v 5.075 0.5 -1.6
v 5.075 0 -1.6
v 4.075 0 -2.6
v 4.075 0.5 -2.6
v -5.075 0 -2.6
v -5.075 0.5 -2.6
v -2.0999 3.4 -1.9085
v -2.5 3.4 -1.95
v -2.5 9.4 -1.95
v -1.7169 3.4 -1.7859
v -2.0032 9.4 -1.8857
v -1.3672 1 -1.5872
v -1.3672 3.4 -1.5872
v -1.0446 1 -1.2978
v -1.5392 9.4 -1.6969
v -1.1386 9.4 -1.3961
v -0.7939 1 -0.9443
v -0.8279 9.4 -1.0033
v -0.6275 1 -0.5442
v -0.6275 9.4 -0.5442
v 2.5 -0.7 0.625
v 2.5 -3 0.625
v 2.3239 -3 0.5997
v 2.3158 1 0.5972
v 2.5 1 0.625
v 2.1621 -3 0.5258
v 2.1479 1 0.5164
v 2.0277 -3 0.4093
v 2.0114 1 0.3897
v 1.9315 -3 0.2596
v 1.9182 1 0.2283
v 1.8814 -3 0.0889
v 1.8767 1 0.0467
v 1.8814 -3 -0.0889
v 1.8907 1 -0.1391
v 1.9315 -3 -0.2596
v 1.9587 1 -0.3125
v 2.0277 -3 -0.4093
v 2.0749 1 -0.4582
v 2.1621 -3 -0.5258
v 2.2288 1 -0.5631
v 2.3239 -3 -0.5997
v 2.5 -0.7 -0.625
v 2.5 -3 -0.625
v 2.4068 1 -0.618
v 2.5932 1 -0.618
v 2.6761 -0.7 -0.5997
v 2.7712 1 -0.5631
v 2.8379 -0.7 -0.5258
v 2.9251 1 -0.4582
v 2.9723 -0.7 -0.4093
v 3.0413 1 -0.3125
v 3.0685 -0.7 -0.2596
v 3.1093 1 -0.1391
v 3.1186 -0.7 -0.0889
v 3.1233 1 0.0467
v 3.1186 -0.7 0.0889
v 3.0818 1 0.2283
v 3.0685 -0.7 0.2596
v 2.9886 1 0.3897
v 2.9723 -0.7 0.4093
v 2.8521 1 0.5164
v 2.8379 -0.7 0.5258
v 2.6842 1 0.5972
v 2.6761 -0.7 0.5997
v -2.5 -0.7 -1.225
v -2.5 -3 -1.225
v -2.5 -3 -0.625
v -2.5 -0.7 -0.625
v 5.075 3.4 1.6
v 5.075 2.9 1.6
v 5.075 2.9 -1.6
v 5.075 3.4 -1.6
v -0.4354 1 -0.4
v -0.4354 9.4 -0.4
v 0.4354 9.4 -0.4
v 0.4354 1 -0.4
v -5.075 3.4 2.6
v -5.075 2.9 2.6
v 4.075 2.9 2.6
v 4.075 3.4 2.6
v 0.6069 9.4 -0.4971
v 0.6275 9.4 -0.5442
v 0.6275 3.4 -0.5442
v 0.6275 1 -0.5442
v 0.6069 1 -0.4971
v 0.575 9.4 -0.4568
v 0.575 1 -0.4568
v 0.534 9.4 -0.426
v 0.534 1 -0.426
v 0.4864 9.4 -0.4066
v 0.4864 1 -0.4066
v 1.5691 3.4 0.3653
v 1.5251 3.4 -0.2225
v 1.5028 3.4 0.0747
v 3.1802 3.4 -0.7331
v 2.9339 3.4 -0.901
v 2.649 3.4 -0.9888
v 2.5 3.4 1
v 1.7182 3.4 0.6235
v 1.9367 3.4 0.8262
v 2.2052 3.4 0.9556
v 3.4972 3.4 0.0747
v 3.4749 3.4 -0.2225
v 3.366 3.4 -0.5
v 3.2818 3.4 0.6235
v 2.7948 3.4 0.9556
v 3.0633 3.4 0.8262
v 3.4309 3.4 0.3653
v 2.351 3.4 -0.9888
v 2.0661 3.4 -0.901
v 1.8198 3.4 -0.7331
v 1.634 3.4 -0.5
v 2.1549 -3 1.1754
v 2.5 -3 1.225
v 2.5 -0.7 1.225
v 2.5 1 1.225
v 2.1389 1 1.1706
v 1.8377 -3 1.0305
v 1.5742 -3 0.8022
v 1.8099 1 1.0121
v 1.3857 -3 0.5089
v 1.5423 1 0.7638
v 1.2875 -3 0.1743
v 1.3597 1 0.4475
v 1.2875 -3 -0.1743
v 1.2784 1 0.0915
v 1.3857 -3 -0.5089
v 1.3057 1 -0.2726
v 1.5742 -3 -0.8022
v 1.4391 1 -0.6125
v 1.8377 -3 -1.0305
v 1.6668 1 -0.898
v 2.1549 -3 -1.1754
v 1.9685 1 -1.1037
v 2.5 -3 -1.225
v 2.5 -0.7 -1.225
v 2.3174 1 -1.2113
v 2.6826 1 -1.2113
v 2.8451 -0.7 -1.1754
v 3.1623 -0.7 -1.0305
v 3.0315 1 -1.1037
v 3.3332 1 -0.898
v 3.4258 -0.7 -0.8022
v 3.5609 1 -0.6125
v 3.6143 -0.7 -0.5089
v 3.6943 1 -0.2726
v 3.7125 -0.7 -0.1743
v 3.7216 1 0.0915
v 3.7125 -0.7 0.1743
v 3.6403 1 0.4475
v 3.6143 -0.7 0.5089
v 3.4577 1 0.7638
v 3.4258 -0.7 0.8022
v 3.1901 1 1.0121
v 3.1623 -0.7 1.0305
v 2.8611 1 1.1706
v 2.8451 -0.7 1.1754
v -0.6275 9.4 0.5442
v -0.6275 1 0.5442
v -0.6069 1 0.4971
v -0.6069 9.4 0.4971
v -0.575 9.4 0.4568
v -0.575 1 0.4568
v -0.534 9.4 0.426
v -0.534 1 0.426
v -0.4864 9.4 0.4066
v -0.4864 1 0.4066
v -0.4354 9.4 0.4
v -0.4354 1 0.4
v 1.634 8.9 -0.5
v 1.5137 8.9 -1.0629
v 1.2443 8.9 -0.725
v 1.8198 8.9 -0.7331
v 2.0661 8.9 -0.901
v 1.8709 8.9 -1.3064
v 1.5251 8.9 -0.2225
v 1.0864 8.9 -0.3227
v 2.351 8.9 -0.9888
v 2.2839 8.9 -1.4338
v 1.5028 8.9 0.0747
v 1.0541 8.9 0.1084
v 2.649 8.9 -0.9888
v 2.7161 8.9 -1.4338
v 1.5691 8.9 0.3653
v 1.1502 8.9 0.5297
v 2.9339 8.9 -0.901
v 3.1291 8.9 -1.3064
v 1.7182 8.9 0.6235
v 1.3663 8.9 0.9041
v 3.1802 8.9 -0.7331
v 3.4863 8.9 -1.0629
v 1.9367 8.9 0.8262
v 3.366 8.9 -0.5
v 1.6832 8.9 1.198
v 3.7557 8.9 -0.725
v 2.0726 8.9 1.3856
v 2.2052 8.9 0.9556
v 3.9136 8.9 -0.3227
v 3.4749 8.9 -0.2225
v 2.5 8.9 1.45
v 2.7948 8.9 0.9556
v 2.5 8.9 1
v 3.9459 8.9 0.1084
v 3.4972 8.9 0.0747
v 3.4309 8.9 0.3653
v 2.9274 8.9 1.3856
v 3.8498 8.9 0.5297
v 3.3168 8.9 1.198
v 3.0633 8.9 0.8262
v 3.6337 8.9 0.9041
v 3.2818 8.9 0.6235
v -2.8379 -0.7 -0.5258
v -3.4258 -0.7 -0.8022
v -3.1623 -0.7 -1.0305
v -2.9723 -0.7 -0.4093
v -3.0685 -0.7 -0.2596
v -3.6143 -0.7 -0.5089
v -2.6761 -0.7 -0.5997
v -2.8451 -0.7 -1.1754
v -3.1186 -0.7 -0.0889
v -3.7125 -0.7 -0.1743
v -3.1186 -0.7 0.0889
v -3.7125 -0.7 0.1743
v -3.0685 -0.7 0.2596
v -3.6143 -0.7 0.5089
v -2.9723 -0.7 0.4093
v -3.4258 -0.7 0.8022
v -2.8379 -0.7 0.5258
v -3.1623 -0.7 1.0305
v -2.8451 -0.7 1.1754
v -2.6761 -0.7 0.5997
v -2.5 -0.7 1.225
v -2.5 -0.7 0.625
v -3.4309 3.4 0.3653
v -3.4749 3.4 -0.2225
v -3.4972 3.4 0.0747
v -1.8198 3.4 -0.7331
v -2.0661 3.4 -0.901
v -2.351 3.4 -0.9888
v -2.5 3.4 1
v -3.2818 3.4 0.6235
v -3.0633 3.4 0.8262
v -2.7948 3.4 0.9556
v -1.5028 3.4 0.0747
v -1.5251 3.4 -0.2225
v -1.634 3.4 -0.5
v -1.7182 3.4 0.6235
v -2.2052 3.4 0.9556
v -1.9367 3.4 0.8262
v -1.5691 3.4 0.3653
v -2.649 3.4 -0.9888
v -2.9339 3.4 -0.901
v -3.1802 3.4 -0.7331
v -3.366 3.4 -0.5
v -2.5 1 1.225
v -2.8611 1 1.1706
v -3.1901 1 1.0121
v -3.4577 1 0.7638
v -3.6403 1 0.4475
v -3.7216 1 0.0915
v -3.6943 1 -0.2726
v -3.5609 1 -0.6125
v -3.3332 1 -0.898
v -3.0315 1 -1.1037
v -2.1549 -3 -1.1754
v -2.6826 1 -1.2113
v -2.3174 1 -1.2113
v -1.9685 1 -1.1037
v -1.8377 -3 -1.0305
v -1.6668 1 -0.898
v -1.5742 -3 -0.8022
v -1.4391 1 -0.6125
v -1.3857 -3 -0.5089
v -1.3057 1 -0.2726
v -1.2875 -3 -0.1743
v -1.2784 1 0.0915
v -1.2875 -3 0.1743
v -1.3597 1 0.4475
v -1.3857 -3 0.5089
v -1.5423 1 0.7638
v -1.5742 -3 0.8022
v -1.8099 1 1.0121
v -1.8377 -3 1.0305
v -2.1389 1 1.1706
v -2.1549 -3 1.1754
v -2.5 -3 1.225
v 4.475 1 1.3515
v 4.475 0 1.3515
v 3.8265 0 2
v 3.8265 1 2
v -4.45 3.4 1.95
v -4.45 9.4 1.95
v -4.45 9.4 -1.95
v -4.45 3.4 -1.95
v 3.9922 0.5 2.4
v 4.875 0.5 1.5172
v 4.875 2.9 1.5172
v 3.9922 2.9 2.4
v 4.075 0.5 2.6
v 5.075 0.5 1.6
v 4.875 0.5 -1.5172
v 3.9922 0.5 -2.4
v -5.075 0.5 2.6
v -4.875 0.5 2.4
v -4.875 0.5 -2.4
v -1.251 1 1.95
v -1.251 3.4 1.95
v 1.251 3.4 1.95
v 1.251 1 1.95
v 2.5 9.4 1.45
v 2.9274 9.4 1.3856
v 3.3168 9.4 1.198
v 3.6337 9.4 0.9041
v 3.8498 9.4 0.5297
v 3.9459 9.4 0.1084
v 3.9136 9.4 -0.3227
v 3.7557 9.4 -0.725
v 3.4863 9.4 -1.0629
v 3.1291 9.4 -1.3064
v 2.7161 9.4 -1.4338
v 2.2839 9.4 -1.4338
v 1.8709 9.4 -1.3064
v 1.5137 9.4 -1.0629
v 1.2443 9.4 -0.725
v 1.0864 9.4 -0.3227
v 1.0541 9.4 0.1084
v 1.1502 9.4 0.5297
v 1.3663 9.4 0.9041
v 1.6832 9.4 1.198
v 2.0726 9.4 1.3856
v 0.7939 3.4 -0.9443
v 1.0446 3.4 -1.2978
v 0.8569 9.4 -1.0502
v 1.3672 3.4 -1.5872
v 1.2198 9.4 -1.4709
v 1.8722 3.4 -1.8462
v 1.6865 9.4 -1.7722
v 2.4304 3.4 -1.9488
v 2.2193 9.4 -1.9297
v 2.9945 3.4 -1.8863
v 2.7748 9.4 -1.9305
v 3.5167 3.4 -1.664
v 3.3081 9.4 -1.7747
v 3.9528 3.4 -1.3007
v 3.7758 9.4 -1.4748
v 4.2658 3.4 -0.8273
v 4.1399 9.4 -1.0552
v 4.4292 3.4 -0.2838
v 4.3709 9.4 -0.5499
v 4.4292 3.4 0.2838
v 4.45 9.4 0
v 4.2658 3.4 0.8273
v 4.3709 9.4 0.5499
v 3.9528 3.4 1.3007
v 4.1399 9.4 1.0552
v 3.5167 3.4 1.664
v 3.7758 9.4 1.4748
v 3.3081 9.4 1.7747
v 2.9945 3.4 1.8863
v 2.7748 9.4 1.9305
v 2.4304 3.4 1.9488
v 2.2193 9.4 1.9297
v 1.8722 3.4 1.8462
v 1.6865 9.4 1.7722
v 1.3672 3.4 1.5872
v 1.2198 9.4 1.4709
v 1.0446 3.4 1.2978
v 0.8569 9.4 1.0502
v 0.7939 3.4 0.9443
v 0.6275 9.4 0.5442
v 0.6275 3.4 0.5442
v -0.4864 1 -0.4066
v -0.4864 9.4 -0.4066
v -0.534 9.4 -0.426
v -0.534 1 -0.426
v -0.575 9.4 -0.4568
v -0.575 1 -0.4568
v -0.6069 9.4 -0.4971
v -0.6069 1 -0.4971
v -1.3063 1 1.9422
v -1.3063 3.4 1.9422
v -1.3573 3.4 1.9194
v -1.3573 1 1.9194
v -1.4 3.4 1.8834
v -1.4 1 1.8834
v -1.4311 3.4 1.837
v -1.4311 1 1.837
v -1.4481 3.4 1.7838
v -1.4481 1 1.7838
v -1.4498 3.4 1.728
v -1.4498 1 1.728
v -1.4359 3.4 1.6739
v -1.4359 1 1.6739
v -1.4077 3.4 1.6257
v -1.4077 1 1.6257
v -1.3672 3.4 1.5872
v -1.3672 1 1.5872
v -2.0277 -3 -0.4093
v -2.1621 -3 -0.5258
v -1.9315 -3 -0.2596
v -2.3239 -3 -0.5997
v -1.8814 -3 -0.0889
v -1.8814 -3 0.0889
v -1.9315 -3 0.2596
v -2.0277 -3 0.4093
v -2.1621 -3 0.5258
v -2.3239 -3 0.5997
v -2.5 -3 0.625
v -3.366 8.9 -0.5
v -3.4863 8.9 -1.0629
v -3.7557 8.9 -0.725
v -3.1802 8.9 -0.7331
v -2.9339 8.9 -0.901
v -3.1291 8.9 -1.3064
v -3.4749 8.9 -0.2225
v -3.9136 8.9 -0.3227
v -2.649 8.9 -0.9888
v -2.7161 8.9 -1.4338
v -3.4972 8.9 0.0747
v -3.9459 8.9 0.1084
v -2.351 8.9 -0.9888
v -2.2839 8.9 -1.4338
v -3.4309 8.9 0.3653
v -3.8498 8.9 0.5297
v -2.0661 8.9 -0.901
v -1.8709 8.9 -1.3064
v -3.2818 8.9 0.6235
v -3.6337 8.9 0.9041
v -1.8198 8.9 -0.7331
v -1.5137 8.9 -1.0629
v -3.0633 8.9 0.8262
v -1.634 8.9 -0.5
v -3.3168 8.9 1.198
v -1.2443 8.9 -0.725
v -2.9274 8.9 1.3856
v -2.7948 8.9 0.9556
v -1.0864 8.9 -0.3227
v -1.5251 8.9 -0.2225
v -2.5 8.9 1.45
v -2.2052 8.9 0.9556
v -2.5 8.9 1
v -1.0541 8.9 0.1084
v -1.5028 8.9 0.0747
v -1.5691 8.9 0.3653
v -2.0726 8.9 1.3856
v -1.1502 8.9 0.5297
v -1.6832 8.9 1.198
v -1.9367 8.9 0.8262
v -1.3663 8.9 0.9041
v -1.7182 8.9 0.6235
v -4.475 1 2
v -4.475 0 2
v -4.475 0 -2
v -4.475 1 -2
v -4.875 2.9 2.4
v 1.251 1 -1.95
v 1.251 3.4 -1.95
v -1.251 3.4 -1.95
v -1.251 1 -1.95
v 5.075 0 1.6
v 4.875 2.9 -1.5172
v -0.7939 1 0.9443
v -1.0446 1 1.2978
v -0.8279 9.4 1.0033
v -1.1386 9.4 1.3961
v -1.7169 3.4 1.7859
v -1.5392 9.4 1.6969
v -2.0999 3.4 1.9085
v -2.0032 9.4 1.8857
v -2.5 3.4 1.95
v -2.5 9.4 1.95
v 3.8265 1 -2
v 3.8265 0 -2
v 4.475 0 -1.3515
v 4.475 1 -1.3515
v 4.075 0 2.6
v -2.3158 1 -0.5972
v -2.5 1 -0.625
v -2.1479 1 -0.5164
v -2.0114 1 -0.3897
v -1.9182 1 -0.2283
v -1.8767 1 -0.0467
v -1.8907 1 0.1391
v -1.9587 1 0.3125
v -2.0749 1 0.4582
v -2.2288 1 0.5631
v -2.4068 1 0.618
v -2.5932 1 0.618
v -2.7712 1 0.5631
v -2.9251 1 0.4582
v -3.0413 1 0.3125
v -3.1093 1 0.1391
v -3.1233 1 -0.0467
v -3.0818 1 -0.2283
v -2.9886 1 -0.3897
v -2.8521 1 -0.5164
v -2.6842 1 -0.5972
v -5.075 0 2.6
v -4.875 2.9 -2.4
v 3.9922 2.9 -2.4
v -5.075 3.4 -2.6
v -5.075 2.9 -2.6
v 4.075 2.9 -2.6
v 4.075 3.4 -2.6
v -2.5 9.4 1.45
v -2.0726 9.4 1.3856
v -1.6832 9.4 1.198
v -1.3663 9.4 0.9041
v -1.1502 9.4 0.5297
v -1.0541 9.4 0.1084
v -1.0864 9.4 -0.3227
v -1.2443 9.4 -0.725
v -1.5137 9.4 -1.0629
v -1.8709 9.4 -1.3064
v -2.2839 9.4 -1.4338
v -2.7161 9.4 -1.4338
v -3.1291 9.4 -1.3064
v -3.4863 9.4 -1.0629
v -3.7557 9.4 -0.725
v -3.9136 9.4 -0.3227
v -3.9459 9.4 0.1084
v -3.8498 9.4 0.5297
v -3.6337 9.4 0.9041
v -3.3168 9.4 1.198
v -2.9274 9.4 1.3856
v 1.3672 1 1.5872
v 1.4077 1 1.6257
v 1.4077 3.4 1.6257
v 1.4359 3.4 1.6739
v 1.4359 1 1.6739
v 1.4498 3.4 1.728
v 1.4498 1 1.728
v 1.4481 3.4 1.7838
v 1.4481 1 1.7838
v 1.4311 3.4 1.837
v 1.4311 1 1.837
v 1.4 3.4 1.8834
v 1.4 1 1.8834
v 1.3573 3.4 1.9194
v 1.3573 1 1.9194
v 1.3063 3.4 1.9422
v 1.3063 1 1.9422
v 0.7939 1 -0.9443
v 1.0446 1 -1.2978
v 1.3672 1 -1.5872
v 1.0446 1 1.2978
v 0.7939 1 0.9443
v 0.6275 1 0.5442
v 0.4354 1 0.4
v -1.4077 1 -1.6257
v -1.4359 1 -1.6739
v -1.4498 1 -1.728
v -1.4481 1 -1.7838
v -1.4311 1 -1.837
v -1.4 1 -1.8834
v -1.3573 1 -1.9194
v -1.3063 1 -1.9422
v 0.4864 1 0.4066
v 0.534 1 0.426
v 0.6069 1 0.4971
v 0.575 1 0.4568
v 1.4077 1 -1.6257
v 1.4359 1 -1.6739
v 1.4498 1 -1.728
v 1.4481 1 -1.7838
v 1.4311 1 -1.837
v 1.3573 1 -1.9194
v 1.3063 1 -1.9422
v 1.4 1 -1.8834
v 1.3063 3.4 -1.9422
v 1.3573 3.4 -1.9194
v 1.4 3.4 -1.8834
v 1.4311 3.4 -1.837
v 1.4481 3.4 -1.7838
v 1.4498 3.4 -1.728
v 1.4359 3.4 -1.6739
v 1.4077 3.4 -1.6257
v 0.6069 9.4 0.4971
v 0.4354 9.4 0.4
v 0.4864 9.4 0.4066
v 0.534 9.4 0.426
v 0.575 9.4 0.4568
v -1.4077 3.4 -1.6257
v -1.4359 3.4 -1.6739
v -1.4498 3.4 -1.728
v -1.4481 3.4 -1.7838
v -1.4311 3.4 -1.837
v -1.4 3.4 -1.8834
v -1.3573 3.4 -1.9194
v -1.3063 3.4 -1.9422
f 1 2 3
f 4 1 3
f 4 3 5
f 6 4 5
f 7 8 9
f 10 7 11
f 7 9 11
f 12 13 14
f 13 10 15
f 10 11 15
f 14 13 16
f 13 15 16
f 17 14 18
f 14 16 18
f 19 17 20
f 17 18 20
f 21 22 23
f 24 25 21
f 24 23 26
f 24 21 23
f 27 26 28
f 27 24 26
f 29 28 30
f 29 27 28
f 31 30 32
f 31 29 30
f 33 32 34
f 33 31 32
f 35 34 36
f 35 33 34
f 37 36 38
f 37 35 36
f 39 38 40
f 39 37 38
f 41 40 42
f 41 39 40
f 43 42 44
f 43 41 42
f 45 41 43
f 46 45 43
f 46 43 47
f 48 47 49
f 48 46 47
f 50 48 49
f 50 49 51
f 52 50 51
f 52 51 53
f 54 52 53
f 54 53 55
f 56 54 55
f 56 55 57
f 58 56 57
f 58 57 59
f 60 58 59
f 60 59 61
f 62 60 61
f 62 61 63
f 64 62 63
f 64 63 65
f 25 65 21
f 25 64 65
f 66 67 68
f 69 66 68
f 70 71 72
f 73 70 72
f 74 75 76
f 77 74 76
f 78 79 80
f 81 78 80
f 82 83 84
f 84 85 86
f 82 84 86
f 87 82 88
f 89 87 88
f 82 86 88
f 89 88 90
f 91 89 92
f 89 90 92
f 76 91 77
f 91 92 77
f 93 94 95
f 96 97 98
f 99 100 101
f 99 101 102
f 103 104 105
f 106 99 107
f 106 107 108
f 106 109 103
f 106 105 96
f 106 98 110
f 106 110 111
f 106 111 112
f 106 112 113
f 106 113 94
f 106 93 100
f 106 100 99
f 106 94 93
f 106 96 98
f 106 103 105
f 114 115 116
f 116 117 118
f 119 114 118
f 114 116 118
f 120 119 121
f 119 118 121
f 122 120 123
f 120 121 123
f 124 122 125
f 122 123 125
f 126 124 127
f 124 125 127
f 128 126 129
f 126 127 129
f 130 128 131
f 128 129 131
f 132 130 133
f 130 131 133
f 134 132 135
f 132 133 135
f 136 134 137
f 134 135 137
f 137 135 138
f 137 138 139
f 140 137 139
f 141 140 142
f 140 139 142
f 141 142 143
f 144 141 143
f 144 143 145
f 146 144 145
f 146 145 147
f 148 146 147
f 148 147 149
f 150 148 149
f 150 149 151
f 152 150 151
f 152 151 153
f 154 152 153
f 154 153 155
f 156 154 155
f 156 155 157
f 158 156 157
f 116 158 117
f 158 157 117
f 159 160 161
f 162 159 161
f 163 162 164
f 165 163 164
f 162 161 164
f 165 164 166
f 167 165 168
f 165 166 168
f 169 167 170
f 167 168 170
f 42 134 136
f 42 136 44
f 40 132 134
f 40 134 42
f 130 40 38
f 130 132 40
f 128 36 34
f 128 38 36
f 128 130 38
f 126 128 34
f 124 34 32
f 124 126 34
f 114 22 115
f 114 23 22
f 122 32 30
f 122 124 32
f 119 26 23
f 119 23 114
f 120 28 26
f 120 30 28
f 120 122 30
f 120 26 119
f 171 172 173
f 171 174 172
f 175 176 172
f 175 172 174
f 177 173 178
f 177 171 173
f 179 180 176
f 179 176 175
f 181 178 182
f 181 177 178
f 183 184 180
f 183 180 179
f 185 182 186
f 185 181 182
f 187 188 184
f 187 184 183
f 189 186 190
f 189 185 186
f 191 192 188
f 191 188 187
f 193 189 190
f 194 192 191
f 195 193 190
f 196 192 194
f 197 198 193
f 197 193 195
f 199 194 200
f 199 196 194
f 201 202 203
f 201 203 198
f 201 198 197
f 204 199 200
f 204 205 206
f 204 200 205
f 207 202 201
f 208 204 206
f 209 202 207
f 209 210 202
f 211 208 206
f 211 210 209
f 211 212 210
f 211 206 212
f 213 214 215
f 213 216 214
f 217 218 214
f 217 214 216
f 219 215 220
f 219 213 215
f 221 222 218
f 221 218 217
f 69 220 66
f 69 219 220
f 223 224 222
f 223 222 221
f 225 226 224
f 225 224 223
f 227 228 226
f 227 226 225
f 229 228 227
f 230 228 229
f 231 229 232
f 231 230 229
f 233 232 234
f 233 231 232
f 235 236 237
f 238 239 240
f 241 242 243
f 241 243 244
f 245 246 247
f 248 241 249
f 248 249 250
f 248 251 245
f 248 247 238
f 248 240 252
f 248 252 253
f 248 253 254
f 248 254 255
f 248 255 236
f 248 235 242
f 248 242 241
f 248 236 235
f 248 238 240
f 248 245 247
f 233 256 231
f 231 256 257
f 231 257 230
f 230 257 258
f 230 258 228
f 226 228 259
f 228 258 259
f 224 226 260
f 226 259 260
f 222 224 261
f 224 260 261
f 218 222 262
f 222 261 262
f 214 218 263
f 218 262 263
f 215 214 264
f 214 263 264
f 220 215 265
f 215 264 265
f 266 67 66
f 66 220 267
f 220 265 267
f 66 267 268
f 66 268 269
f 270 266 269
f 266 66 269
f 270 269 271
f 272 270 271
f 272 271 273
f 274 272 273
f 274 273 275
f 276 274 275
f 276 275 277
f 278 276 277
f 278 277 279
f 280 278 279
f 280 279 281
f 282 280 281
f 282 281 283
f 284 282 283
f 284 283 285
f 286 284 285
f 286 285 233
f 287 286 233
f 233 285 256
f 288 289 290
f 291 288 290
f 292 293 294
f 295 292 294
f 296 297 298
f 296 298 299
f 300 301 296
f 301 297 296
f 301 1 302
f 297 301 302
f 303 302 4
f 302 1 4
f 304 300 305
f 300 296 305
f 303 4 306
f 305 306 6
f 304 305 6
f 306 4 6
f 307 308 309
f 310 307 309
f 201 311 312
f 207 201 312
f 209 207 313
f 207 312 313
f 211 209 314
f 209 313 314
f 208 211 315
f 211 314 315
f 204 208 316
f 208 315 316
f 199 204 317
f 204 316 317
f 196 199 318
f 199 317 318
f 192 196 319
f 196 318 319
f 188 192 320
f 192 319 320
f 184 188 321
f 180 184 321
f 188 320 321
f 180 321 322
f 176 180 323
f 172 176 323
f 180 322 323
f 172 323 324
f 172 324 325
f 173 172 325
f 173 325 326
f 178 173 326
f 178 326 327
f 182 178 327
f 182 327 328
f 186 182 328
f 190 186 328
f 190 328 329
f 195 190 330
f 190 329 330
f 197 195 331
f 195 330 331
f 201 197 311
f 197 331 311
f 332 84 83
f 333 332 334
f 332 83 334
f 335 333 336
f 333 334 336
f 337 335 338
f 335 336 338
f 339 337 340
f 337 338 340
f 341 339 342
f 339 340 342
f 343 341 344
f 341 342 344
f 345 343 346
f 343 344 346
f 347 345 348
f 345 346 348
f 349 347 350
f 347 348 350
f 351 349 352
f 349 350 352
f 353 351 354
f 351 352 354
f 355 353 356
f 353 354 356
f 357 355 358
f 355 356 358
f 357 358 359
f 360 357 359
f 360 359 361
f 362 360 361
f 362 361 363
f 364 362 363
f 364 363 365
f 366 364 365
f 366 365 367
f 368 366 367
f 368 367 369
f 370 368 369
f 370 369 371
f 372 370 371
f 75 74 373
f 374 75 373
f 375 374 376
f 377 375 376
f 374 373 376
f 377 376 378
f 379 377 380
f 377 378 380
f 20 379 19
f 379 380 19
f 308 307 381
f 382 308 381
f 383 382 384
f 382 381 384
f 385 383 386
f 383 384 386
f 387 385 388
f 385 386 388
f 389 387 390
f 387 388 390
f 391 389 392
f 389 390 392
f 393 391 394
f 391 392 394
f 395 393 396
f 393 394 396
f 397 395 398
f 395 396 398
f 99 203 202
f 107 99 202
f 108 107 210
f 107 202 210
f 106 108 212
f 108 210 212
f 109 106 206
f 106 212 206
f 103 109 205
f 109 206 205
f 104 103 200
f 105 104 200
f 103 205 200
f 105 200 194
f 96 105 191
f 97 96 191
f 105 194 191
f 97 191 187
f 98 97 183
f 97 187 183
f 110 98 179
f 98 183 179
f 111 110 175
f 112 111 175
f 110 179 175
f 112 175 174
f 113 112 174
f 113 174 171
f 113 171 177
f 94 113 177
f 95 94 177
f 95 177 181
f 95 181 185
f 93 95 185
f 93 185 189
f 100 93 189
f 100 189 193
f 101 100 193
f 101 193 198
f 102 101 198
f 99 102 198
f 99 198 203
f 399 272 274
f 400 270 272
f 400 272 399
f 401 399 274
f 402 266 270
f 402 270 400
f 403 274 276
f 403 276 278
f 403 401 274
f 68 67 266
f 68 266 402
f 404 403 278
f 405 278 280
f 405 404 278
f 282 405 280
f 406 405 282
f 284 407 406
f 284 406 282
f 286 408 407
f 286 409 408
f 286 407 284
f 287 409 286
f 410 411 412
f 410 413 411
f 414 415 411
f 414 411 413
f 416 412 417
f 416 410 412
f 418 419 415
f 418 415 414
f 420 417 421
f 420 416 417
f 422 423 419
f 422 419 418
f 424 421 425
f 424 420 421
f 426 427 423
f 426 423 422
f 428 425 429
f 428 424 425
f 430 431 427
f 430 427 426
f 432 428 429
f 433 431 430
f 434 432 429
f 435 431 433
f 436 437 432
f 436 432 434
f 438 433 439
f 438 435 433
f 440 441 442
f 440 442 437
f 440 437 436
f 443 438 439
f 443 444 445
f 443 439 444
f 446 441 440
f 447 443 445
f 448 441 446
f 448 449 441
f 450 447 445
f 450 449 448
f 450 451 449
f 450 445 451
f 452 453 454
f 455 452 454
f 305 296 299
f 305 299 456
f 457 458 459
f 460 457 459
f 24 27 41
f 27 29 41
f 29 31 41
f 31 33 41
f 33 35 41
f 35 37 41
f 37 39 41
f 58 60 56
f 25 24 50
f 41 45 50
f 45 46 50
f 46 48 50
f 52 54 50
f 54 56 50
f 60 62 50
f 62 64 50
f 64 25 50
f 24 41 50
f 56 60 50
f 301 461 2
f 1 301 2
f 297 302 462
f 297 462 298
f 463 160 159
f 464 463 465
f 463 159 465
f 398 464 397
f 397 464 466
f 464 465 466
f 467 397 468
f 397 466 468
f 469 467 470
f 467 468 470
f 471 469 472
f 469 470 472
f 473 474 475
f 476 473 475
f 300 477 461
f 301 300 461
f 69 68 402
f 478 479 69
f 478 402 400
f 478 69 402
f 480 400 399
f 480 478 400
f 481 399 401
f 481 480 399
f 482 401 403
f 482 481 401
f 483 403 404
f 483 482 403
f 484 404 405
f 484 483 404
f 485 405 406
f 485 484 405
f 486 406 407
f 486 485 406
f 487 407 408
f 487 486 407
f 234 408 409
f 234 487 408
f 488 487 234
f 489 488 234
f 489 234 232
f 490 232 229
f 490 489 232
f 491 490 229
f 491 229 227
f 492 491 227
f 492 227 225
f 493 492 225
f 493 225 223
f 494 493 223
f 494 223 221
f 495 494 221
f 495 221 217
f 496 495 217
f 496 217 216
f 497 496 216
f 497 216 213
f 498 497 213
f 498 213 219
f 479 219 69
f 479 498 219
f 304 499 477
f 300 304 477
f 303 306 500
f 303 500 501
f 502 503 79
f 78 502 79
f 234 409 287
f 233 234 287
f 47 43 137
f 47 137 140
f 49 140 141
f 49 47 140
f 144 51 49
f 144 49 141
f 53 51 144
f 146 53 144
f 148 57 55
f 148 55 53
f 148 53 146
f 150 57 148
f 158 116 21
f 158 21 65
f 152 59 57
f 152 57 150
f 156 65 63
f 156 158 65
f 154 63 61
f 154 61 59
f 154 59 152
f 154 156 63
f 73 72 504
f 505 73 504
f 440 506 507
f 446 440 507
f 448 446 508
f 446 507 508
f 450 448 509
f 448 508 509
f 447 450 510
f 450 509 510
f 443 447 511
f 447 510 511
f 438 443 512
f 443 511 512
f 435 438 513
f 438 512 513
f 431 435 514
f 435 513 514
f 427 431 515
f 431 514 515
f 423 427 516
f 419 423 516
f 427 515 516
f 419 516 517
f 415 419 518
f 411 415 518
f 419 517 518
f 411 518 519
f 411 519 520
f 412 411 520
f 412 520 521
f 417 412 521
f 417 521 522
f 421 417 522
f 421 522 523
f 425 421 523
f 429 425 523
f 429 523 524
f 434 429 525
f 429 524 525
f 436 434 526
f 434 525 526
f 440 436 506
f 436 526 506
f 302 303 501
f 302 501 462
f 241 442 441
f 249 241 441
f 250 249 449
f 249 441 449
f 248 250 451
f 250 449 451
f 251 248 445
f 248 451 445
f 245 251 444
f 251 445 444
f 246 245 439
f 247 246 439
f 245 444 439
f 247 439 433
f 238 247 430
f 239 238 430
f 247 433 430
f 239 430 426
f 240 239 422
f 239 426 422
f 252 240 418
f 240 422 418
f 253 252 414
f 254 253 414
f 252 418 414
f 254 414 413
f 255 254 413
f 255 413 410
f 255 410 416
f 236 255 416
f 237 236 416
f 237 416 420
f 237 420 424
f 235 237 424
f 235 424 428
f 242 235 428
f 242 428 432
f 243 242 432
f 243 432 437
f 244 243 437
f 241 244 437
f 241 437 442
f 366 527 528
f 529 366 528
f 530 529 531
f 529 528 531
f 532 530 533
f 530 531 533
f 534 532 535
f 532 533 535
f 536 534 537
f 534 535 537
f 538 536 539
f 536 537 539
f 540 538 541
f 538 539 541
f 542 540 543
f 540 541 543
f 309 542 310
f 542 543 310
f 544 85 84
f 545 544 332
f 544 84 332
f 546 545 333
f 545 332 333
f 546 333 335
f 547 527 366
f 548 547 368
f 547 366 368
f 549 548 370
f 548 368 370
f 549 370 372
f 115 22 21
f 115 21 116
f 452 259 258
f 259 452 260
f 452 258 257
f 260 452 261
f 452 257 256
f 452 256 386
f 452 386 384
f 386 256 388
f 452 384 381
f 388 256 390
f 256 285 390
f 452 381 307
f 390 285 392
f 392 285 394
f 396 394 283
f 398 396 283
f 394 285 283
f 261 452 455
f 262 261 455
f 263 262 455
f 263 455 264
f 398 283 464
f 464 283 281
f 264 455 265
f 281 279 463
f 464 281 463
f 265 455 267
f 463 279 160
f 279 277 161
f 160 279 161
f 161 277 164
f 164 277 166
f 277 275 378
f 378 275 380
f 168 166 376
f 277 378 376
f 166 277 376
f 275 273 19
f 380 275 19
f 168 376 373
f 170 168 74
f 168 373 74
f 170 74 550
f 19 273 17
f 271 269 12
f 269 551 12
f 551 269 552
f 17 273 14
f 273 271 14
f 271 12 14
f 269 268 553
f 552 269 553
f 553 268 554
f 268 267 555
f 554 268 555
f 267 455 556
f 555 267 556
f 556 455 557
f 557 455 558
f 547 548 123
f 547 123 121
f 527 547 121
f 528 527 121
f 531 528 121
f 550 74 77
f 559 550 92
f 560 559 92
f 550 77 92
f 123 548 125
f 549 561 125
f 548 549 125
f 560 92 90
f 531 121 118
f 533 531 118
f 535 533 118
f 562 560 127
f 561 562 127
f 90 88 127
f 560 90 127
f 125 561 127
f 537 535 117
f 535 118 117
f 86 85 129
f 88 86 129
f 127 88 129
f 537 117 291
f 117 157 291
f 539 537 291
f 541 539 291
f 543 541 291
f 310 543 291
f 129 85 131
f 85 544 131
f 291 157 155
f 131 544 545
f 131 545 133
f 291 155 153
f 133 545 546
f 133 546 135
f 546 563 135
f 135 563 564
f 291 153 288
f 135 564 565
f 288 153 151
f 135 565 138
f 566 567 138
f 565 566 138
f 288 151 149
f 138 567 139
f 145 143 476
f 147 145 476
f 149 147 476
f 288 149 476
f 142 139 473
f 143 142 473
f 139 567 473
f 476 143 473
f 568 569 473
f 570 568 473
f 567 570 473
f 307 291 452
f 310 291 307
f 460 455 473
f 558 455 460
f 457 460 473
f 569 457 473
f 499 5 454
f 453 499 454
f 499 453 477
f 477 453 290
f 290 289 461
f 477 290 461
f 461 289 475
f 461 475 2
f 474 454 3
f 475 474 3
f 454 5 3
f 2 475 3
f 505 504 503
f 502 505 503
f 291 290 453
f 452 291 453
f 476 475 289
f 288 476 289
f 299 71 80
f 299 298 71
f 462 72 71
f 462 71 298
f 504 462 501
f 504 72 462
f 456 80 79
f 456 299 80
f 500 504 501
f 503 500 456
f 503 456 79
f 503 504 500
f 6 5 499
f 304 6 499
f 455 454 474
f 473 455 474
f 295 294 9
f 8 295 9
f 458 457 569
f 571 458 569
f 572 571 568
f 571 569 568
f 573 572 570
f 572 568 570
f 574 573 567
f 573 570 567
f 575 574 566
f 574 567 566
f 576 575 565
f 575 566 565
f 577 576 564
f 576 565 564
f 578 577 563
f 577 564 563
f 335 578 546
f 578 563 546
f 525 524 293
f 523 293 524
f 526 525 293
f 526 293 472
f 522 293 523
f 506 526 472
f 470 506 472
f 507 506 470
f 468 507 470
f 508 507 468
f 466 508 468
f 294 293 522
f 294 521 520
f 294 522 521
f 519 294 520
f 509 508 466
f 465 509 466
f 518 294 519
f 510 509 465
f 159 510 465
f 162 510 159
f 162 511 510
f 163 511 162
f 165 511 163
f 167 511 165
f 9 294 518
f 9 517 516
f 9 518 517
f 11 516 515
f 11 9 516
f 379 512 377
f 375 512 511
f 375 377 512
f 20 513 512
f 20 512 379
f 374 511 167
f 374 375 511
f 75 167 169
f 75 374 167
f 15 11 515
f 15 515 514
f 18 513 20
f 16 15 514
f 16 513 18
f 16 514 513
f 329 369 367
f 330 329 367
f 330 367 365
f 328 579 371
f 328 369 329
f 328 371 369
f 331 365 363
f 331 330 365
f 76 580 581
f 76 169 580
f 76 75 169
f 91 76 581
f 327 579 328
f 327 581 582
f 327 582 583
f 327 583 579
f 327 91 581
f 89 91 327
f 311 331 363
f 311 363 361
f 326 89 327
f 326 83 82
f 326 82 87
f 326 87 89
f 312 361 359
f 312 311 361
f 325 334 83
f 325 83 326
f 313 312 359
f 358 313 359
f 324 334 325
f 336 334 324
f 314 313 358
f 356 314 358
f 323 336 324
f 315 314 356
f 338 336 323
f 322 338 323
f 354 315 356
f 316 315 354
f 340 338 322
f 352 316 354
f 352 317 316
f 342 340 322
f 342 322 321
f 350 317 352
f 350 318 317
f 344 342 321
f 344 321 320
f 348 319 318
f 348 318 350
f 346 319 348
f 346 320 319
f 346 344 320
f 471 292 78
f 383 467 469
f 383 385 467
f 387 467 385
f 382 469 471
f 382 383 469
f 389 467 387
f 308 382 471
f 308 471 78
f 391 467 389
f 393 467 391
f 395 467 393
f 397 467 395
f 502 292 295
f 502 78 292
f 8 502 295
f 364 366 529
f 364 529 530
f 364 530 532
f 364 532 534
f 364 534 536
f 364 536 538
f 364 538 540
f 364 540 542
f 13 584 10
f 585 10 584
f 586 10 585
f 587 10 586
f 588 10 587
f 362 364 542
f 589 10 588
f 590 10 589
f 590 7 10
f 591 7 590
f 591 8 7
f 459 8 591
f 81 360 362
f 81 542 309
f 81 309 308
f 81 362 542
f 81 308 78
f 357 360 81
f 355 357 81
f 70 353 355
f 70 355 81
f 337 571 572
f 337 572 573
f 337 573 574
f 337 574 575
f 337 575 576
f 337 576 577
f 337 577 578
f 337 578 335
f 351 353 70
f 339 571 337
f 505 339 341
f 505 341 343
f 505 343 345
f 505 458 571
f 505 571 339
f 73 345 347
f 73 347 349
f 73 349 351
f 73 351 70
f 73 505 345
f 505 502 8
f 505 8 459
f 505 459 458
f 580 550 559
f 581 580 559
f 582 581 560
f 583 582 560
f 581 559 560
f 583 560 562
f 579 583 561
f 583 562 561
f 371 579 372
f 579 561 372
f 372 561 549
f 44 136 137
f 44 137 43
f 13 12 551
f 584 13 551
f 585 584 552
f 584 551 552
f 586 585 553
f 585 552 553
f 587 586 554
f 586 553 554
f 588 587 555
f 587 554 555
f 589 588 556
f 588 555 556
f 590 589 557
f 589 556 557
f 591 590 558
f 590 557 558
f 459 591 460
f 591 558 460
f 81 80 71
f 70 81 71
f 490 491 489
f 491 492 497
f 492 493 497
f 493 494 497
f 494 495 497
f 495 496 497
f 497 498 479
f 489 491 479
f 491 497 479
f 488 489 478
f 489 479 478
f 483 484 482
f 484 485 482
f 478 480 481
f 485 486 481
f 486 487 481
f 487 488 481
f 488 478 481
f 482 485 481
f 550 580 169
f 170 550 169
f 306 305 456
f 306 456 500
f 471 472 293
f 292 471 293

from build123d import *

# Parameters (mm, degrees)
BOSS_EXTRUDE1_DEPTH = 9.4
SKETCH2_R           = 1
CUT_EXTRUDE1_DEPTH  = 6
SKETCH3_R           = 1.45
CUT_EXTRUDE2_DEPTH  = 0.5
CUT_EXTRUDE3_DEPTH  = 1
CUT_EXTRUDE4_REACH  = 10.277
FILLET1_START       = 1
FILLET1_DEPTH       = 2.4
FILLET1_START_2     = 3.146512
FILLET1_2_DEPTH     = 6.253488
SKETCH6_R           = 1.225
SKETCH6_R_2         = 0.625
BOSS_EXTRUDE2_DEPTH = 4
SKETCH7_W           = 1.225
SKETCH7_H           = 2.45
CUT_EXTRUDE5_DEPTH  = 2.3
CUT_EXTRUDE6_DEPTH  = 2.4


with BuildPart() as part:
    # Sketch1 → Boss-Extrude1 (new body)
    with BuildSketch(Plane(origin=(0, 0, 0), x_dir=(1, 0, 0), z_dir=(0, 1, 0))):
        Polygon((5.075, 1.6), (4.075, 2.6), (-5.075, 2.6), (-5.075, -2.6), (4.075, -2.6), (5.075, -1.6), align=None)
    extrude(amount=BOSS_EXTRUDE1_DEPTH)

    # Sketch2 → Cut-Extrude1 (cut)
    # profile 1 of 3: a face of its own
    with BuildSketch(Plane(origin=(0, 9.4, 0), x_dir=(1, 0, 0), z_dir=(0, 1, 0))):
        Polygon((4.075, -2.6), (5.075, -1.6), (5.075, 1.6), (4.075, 2.6), (-5.075, 2.6), (-5.075, -2.6), align=None)
        with BuildLine():
            Line((-2.5, -1.95), (-4.45, -1.95))
            Line((-4.45, -1.95), (-4.45, 1.95))
            Line((-4.45, 1.95), (-2.5, 1.95))
            ThreePointArc((-2.5, 1.95), (-1.270670915, 1.51368755), (-0.591466532, 0.4))
            Line((-0.591466532, 0.4), (0.591466532, 0.4))
            ThreePointArc((0.591466532, 0.4), (4.45, 0), (0.591466532, -0.4))
            Line((0.591466532, -0.4), (-0.591466532, -0.4))
            ThreePointArc((-0.591466532, -0.4), (-1.270670915, -1.51368755), (-2.5, -1.95))
        make_face(mode=Mode.SUBTRACT)
    # profile 2 of 3: a face of its own
    with BuildSketch(Plane(origin=(0, 9.4, 0), x_dir=(1, 0, 0), z_dir=(0, 1, 0))):
        with Locations(Location((2.5, 0, 0), (0, 0, 270))):
            Circle(SKETCH2_R)
    # profile 3 of 3: a face of its own
    with BuildSketch(Plane(origin=(0, 9.4, 0), x_dir=(1, 0, 0), z_dir=(0, 1, 0))):
        with Locations(Location((-2.5, 0, 0), (0, 0, 270))):
            Circle(SKETCH2_R)
    extrude(amount=-CUT_EXTRUDE1_DEPTH, mode=Mode.SUBTRACT)

    # Sketch3 → Cut-Extrude2 (cut)
    with BuildSketch(Plane(origin=(0, 9.4, 0), x_dir=(1, 0, 0), z_dir=(0, 1, 0))):
        with Locations(Location((-2.5, 0, 0), (0, 0, 270))):
            Circle(SKETCH3_R)
        with Locations(Location((2.5, 0, 0), (0, 0, 270))):
            Circle(SKETCH3_R)
    extrude(amount=-CUT_EXTRUDE2_DEPTH, mode=Mode.SUBTRACT)

    # Sketch4 → Cut-Extrude3 (cut)
    with BuildSketch(Plane.XZ):
        Polygon((3.826471863, 2), (-4.475, 2), (-4.475, -2), (3.826471863, -2), (4.475, -1.351471863), (4.475, 1.351471863), align=None)
    extrude(amount=-CUT_EXTRUDE3_DEPTH, mode=Mode.SUBTRACT)

    # Sketch5 → Cut-Extrude4 (cut, up to next)
    with BuildSketch(Plane(origin=(0, 3.4, 0), x_dir=(1, 0, 0), z_dir=(0, 1, 0)), mode=Mode.PRIVATE) as cut_extrude4_sk1:
        with BuildLine():
            Line((2.5, 1.95), (-2.5, 1.95))
            ThreePointArc((-2.5, 1.95), (-1.270670915, 1.51368755), (-0.591466532, 0.4))
            Line((-0.591466532, 0.4), (0.591466532, 0.4))
            ThreePointArc((0.591466532, 0.4), (1.270670915, 1.51368755), (2.5, 1.95))
        make_face()
    cut_extrude4_tool1 = extrude(cut_extrude4_sk1.sketch, amount=-CUT_EXTRUDE4_REACH, mode=Mode.PRIVATE) & part.part
    # Sketch5 → Cut-Extrude4 (cut, up to next)
    with BuildSketch(Plane(origin=(0, 3.4, 0), x_dir=(1, 0, 0), z_dir=(0, 1, 0)), mode=Mode.PRIVATE) as cut_extrude4_sk2:
        with BuildLine():
            Line((-2.5, -1.95), (2.5, -1.95))
            ThreePointArc((2.5, -1.95), (1.270670915, -1.51368755), (0.591466532, -0.4))
            Line((0.591466532, -0.4), (-0.591466532, -0.4))
            ThreePointArc((-0.591466532, -0.4), (-1.270670915, -1.51368755), (-2.5, -1.95))
        make_face()
    cut_extrude4_tool2 = extrude(cut_extrude4_sk2.sketch, amount=-CUT_EXTRUDE4_REACH, mode=Mode.PRIVATE) & part.part
    add(cut_extrude4_tool1.solids().sort_by_distance((0, 3.4, -1.344451))[0], mode=Mode.SUBTRACT)
    add(cut_extrude4_tool2.solids().sort_by_distance((0, 3.4, 1.344451))[0], mode=Mode.SUBTRACT)

    # Fillet1: read off the stored shape, not the designer's step
    # Fillet1 outline → Fillet1 (add)
    with BuildSketch(Plane(origin=(0, 0, 0), x_dir=(1, 0, 0), z_dir=(0, 1, 0)).offset(FILLET1_START)):
        with BuildLine():
            ThreePointArc((1.36718641, 1.587209302), (1.905255576, 1.85708887), (2.5, 1.95))
            Line((2.5, 1.95), (1.2510004, 1.95))
            ThreePointArc((1.2510004, 1.95), (1.441471054, 1.810999428), (1.36718641, 1.587209302))
        make_face()
        with BuildLine():
            ThreePointArc((1.36718641, -1.587209302), (1.441471054, -1.810999428), (1.2510004, -1.95))
            Line((1.2510004, -1.95), (2.5, -1.95))
            ThreePointArc((2.5, -1.95), (1.905255576, -1.85708887), (1.36718641, -1.587209302))
        make_face()
        with BuildLine():
            Line((-2.5, -1.95), (-1.2510004, -1.95))
            ThreePointArc((-1.2510004, -1.95), (-1.441471054, -1.810999428), (-1.36718641, -1.587209302))
            ThreePointArc((-1.36718641, -1.587209302), (-1.905255576, -1.857088869), (-2.5, -1.95))
        make_face()
        with BuildLine():
            ThreePointArc((0.435417718, -0.4), (0.555495212, -0.44005815), (0.627471884, -0.544186047))
            ThreePointArc((0.627471884, -0.544186047), (0.608095119, -0.472436154), (0.591466532, -0.4))
            Line((0.591466532, -0.4), (0.435417718, -0.4))
        make_face()
        with BuildLine():
            ThreePointArc((-0.591466532, -0.4), (-0.608095119, -0.472436154), (-0.627471884, -0.544186047))
            ThreePointArc((-0.627471884, -0.544186047), (-0.555495212, -0.44005815), (-0.435417718, -0.4))
            Line((-0.435417718, -0.4), (-0.591466532, -0.4))
        make_face()
        with BuildLine():
            ThreePointArc((-1.36718641, 1.587209302), (-1.441471054, 1.810999428), (-1.2510004, 1.95))
            Line((-1.2510004, 1.95), (-2.5, 1.95))
            ThreePointArc((-2.5, 1.95), (-1.905255576, 1.857088869), (-1.36718641, 1.587209302))
        make_face()
        with BuildLine():
            ThreePointArc((0.591466532, 0.4), (0.608095119, 0.472436154), (0.627471884, 0.544186047))
            ThreePointArc((0.627471884, 0.544186047), (0.555495212, 0.44005815), (0.435417718, 0.4))
            Line((0.435417718, 0.4), (0.591466532, 0.4))
        make_face()
        with BuildLine():
            ThreePointArc((-0.435417718, 0.4), (-0.555495212, 0.44005815), (-0.627471884, 0.544186047))
            ThreePointArc((-0.627471884, 0.544186047), (-0.608095119, 0.472436154), (-0.591466532, 0.4))
            Line((-0.591466532, 0.4), (-0.435417718, 0.4))
        make_face()
    extrude(amount=FILLET1_DEPTH)

    # Fillet1 2 outline → Fillet1 2 (add)
    with BuildSketch(Plane(origin=(0, 0, 0), x_dir=(1, 0, 0), z_dir=(0, 1, 0)).offset(FILLET1_START_2)):
        with BuildLine():
            ThreePointArc((0.435417718, -0.4), (0.555495212, -0.44005815), (0.627471884, -0.544186047))
            ThreePointArc((0.627471884, -0.544186047), (0.608095119, -0.472436154), (0.591466532, -0.4))
            Line((0.591466532, -0.4), (0.435417718, -0.4))
        make_face()
        with BuildLine():
            ThreePointArc((-0.591466532, -0.4), (-0.608095119, -0.472436154), (-0.627471884, -0.544186047))
            ThreePointArc((-0.627471884, -0.544186047), (-0.555495212, -0.44005815), (-0.435417718, -0.4))
            Line((-0.435417718, -0.4), (-0.591466532, -0.4))
        make_face()
        with BuildLine():
            ThreePointArc((0.591466532, 0.4), (0.608095119, 0.472436154), (0.627471884, 0.544186047))
            ThreePointArc((0.627471884, 0.544186047), (0.555495212, 0.44005815), (0.435417718, 0.4))
            Line((0.435417718, 0.4), (0.591466532, 0.4))
        make_face()
        with BuildLine():
            ThreePointArc((-0.435417718, 0.4), (-0.555495212, 0.44005815), (-0.627471884, 0.544186047))
            ThreePointArc((-0.627471884, 0.544186047), (-0.608095119, 0.472436154), (-0.591466532, 0.4))
            Line((-0.591466532, 0.4), (-0.435417718, 0.4))
        make_face()
    extrude(amount=FILLET1_2_DEPTH)

    # Sketch6 → Boss-Extrude2 (add)
    # profile 1 of 2: a face of its own
    with BuildSketch(Plane.XZ.offset(-1)):
        with Locations(Location((-2.5, 0, 0), (0, 0, 90))):
            Circle(SKETCH6_R)
        with Locations(Location((-2.5, 0, 0), (0, 0, 270))):
            Circle(SKETCH6_R_2, mode=Mode.SUBTRACT)
    # profile 2 of 2: a face of its own
    with BuildSketch(Plane.XZ.offset(-1)):
        with Locations(Location((2.5, 0, 0), (0, 0, 90))):
            Circle(SKETCH6_R)
        with Locations(Location((2.5, 0, 0), (0, 0, 90))):
            Circle(SKETCH6_R_2, mode=Mode.SUBTRACT)
    extrude(amount=BOSS_EXTRUDE2_DEPTH)

    # Sketch7 → Cut-Extrude5 (cut)
    with BuildSketch(Plane.XZ.offset(3)):
        with Locations((-3.1125, 0)):
            Rectangle(SKETCH7_W, SKETCH7_H)
        with Locations((3.1125, 0)):
            Rectangle(SKETCH7_W, SKETCH7_H)
    extrude(amount=-CUT_EXTRUDE5_DEPTH, mode=Mode.SUBTRACT)

    # Sketch8 → Cut-Extrude6 (cut)
    with BuildSketch(Plane(origin=(0, 0.5, 0), x_dir=(-1, 0, 0), z_dir=(0, -1, 0))):
        Polygon((-4.075, -2.6), (5.075, -2.6), (5.075, 2.6), (-4.075, 2.6), (-5.075, 1.6), (-5.075, -1.6), align=None)
        Polygon((-3.992157288, -2.4), (4.875, -2.4), (4.875, 2.4), (-3.992157288, 2.4), (-4.875, 1.517157288), (-4.875, -1.517157288), align=None, mode=Mode.SUBTRACT)
    extrude(amount=-CUT_EXTRUDE6_DEPTH, mode=Mode.SUBTRACT)


solid = part.part
